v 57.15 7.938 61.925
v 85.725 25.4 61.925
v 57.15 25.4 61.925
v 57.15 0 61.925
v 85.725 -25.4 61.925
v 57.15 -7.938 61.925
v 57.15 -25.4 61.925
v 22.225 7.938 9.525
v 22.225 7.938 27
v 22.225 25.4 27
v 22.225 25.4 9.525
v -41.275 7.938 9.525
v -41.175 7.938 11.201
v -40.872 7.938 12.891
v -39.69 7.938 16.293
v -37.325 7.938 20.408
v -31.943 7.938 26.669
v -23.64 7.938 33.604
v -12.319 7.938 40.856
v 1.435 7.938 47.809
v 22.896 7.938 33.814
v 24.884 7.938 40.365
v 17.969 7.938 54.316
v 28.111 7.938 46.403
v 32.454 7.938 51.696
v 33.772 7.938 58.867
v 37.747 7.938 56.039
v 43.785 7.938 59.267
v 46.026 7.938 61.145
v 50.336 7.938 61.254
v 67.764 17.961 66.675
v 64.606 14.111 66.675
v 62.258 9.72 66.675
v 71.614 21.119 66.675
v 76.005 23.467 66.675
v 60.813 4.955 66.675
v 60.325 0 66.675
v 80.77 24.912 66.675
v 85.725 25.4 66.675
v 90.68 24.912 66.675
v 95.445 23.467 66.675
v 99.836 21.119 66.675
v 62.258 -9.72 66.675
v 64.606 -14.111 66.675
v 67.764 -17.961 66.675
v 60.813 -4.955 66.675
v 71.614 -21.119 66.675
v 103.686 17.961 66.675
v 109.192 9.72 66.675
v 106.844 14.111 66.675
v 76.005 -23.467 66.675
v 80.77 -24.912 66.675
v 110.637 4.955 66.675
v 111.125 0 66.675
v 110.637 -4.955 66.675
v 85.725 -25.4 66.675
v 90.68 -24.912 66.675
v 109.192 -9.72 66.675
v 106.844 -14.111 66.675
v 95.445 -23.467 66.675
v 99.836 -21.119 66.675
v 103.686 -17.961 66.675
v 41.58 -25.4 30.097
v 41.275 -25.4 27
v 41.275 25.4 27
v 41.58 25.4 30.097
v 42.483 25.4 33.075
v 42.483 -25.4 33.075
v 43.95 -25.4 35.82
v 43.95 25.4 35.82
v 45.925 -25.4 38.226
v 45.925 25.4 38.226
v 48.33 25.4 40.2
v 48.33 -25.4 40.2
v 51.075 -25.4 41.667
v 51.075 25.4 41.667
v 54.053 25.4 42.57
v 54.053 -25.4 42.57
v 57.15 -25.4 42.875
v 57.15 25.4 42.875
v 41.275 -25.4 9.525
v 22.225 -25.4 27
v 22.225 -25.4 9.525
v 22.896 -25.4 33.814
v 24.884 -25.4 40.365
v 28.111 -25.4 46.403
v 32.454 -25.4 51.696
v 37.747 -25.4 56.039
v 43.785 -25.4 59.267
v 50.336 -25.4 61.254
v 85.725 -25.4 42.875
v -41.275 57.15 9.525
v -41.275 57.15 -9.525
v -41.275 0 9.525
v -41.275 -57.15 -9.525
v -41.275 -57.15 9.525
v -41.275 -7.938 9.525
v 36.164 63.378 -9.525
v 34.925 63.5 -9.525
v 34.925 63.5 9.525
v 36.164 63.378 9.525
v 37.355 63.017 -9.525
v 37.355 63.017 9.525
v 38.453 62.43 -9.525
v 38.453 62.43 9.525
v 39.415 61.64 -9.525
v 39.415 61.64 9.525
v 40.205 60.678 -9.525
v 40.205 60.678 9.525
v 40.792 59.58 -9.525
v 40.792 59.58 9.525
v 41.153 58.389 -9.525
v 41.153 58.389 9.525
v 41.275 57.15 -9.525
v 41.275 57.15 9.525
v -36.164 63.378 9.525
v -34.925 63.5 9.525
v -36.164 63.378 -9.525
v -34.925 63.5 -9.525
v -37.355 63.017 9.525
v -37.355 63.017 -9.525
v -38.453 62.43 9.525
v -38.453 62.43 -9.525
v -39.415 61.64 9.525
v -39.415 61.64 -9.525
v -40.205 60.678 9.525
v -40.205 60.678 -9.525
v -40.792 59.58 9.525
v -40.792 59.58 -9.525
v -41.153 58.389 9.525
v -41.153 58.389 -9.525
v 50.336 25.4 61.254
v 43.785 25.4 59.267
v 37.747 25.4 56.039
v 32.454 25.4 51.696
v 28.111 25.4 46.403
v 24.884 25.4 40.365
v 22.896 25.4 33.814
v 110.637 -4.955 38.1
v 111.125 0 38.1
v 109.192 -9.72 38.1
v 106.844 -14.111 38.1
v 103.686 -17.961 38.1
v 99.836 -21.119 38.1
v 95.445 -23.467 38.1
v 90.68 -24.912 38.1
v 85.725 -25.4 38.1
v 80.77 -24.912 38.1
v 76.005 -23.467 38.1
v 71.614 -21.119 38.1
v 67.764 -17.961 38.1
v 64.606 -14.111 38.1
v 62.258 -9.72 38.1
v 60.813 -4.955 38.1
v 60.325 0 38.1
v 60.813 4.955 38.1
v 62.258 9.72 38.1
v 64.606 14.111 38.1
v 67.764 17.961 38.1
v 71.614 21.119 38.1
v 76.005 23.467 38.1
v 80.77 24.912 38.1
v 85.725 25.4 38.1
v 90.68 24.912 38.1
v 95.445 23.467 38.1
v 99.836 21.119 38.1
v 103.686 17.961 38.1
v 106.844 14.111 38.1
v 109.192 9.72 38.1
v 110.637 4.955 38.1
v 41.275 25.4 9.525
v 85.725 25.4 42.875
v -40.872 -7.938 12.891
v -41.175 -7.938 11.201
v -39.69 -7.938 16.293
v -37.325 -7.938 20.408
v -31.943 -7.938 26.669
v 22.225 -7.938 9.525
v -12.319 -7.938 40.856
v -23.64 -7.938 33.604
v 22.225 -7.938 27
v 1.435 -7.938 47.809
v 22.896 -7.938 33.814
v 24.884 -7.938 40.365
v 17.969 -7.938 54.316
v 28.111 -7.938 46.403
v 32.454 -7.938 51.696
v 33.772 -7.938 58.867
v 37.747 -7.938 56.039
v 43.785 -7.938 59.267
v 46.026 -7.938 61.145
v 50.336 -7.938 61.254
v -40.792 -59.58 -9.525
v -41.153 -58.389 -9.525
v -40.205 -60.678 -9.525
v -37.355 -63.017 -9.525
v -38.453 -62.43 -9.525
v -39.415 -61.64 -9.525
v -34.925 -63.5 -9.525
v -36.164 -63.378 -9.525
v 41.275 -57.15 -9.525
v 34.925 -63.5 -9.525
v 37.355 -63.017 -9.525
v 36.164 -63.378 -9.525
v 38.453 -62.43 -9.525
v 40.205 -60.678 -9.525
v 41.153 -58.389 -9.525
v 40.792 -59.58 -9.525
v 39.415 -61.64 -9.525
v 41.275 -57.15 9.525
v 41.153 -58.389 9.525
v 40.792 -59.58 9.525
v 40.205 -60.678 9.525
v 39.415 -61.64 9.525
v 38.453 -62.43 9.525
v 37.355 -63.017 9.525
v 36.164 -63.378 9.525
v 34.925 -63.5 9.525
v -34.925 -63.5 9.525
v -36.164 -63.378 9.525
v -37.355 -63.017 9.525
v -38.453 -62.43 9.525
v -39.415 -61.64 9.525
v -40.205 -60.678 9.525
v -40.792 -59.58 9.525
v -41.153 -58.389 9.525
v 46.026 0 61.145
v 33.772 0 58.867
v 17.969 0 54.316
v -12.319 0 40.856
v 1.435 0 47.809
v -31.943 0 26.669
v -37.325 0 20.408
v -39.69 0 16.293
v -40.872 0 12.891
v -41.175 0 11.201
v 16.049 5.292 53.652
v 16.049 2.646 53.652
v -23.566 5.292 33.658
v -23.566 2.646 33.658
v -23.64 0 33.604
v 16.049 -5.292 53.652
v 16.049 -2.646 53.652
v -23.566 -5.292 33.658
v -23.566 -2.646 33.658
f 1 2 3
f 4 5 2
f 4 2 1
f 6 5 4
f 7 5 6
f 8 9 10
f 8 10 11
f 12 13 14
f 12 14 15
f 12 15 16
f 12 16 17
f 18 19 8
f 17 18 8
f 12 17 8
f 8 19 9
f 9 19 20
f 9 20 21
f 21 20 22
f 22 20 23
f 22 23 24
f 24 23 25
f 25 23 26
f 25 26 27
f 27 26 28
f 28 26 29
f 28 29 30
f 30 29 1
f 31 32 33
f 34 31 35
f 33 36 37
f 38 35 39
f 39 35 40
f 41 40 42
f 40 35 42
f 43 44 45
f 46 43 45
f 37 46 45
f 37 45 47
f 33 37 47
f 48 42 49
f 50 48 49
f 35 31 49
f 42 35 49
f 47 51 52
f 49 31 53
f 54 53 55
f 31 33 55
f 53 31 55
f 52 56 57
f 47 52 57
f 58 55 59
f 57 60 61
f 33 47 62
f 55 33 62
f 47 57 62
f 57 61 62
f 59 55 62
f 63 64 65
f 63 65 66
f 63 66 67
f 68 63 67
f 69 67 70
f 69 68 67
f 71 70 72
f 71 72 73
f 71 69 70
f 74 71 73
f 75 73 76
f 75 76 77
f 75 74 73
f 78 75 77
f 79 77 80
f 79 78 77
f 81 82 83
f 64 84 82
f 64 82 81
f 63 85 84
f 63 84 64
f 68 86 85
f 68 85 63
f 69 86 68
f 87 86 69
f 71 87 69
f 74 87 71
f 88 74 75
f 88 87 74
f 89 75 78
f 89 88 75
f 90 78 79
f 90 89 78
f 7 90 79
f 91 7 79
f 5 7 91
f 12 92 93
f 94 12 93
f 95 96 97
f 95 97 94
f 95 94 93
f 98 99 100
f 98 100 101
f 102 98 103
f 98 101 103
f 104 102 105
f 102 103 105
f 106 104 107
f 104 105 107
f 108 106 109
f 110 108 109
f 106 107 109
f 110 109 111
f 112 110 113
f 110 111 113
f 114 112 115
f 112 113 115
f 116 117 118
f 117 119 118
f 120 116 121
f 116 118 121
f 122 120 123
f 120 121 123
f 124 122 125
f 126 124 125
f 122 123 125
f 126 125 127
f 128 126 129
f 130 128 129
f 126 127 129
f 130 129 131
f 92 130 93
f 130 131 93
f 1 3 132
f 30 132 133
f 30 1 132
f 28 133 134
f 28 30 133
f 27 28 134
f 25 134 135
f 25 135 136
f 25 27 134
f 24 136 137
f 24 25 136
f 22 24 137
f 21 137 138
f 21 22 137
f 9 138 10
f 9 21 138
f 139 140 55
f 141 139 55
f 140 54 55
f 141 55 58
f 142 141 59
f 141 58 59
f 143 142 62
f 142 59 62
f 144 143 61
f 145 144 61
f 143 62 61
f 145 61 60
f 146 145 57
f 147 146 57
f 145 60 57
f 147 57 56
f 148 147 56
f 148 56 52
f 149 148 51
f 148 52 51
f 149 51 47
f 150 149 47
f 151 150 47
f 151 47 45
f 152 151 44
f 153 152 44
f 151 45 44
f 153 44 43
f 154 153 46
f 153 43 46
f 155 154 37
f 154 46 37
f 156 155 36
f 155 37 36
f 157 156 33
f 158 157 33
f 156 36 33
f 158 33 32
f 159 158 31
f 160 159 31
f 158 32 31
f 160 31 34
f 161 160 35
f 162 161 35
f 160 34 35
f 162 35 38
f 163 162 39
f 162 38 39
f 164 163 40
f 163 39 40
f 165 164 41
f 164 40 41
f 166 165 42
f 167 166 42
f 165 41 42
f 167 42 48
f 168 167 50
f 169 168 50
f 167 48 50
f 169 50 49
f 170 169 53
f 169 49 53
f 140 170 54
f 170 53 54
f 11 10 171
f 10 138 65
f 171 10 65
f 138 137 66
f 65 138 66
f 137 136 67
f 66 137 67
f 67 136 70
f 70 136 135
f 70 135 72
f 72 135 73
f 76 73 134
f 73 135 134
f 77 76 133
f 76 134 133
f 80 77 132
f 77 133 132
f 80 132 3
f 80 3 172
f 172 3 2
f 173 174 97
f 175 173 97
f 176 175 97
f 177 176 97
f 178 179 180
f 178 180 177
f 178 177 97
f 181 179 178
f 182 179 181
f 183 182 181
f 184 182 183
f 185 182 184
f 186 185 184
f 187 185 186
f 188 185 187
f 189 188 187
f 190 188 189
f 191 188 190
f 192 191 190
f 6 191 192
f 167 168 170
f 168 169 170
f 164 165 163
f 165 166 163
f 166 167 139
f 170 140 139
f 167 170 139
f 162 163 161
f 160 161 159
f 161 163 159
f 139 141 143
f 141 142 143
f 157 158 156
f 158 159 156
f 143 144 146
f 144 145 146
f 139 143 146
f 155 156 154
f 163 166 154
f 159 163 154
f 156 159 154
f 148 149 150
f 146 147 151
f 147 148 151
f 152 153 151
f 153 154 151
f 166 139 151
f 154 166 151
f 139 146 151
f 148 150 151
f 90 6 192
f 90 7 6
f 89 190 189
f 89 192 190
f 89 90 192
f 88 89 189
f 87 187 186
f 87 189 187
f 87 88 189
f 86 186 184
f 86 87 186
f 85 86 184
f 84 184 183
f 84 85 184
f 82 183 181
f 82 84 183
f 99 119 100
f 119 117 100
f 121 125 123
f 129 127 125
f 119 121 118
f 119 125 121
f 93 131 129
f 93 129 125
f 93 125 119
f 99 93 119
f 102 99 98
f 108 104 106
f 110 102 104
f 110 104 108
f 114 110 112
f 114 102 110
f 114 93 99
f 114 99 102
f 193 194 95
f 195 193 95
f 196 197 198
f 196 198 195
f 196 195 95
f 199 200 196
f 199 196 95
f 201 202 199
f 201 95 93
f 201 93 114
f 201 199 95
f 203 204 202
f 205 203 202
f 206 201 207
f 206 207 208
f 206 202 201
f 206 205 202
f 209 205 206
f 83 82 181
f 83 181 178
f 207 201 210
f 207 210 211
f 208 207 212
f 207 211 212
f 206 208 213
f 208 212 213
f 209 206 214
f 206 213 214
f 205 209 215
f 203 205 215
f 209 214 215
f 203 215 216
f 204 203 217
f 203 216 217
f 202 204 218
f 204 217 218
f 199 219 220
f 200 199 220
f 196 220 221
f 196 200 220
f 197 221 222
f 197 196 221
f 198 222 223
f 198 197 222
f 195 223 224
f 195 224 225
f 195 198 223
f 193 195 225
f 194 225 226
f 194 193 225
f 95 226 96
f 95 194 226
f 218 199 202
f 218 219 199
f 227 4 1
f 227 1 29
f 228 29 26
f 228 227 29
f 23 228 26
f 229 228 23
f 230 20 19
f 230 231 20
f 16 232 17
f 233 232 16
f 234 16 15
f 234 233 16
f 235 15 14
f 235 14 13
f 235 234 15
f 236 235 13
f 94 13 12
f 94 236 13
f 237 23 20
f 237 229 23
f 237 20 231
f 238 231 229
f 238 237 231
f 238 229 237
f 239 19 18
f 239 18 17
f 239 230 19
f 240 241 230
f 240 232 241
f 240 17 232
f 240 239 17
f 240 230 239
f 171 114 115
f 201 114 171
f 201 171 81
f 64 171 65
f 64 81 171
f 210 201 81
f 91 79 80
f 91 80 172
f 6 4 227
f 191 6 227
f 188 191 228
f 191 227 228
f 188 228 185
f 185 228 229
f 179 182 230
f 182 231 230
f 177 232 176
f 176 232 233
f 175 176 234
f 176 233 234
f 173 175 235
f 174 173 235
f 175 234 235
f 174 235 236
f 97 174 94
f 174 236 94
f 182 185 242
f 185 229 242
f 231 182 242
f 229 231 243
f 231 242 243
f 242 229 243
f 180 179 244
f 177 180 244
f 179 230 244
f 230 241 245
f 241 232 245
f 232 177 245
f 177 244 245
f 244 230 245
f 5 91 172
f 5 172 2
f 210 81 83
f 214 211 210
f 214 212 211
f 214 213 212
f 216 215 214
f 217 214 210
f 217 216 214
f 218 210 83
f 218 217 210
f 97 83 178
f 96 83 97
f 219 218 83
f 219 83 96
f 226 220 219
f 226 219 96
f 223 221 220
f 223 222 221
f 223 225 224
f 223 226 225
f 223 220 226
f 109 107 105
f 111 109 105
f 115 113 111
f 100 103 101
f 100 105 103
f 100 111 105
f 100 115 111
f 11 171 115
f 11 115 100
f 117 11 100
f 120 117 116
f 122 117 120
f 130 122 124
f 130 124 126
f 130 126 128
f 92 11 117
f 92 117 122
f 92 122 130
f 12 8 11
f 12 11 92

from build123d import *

# Parameters (mm, degrees)
F1_DEPTH = 63.5
F0_W     = 25.4
F0_H     = 19.05
F2_DEPTH = 25.4
F3_DEPTH = 7.9375
F5_R     = 6.35


with BuildPart() as f1:
    # F0 (on Front) → F1 (new body, symmetric)
    with BuildSketch(Plane.XZ):
        Polygon((-41.275, -9.525), (41.275, -9.525), (41.275, 9.525), (22.225, 9.525), (-41.275, 9.525), align=None)
    extrude(amount=F1_DEPTH, both=True)

    # F0 (on Front) → F2 (join, symmetric)
    with BuildSketch(Plane.XZ):
        with BuildLine():
            Line((22.225, 9.525), (41.275, 9.525))
            Line((41.275, 9.525), (41.275, 27.0002))
            ThreePointArc((41.275, 27.0002), (45.9246798487, 38.2255201513), (57.15, 42.8752))
            Line((57.15, 42.8752), (60.325, 42.8752))
            Line((60.325, 42.8752), (60.325, 61.9252))
            Line((60.325, 61.9252), (57.15, 61.9252))
            ThreePointArc((57.15, 61.9252), (32.4542956671, 51.6959043329), (22.225, 27.0002))
            Line((22.225, 27.0002), (22.225, 9.525))
        make_face()
        with Locations((73.025, 52.4002)):
            Rectangle(F0_W, F0_H)
    extrude(amount=F2_DEPTH, both=True)

    # F0 (on Front) → F3 (join, symmetric)
    with BuildSketch(Plane.XZ):
        with BuildLine():
            add(Edge.make_bspline(
                [(57.15, 61.9252), (22.114219144, 62.0401166379), (-41.326597333, 33.19966048), (-41.275, 9.525)],
                knots=[0, 0, 0, 0, 111.5045361635, 111.5045361635, 111.5045361635, 111.5045361635], degree=3))
            Line((-41.275, 9.525), (22.225, 9.525))
            Line((22.225, 9.525), (22.225, 27.0002))
            ThreePointArc((22.225, 27.0002), (32.4542956671, 51.6959043329), (57.15, 61.9252))
        make_face()
    extrude(amount=F3_DEPTH, both=True)

    # F5
    f5_edges = [f1.edges().sort_by_distance(p)[0] for p in [
        (41.275, -63.5, 0),
        (-41.275, -63.5, 0),
        (-41.275, 63.5, 0),
        (41.275, 63.5, 0),
    ]]
    fillet(f5_edges, radius=F5_R)


with BuildPart() as f4:
    # F0 (on Front) → F4 (revolve)
    with BuildSketch(Plane.XZ):
        Polygon((85.725, 66.675), (85.725, 61.9252), (85.725, 42.8752), (85.725, 38.1), (111.125, 38.1), (111.125, 66.675), align=None)
    revolve(axis=Axis((85.725, 0, 52.3875), (0, 0, -1)))


solid = Compound([f1.part, f4.part])
